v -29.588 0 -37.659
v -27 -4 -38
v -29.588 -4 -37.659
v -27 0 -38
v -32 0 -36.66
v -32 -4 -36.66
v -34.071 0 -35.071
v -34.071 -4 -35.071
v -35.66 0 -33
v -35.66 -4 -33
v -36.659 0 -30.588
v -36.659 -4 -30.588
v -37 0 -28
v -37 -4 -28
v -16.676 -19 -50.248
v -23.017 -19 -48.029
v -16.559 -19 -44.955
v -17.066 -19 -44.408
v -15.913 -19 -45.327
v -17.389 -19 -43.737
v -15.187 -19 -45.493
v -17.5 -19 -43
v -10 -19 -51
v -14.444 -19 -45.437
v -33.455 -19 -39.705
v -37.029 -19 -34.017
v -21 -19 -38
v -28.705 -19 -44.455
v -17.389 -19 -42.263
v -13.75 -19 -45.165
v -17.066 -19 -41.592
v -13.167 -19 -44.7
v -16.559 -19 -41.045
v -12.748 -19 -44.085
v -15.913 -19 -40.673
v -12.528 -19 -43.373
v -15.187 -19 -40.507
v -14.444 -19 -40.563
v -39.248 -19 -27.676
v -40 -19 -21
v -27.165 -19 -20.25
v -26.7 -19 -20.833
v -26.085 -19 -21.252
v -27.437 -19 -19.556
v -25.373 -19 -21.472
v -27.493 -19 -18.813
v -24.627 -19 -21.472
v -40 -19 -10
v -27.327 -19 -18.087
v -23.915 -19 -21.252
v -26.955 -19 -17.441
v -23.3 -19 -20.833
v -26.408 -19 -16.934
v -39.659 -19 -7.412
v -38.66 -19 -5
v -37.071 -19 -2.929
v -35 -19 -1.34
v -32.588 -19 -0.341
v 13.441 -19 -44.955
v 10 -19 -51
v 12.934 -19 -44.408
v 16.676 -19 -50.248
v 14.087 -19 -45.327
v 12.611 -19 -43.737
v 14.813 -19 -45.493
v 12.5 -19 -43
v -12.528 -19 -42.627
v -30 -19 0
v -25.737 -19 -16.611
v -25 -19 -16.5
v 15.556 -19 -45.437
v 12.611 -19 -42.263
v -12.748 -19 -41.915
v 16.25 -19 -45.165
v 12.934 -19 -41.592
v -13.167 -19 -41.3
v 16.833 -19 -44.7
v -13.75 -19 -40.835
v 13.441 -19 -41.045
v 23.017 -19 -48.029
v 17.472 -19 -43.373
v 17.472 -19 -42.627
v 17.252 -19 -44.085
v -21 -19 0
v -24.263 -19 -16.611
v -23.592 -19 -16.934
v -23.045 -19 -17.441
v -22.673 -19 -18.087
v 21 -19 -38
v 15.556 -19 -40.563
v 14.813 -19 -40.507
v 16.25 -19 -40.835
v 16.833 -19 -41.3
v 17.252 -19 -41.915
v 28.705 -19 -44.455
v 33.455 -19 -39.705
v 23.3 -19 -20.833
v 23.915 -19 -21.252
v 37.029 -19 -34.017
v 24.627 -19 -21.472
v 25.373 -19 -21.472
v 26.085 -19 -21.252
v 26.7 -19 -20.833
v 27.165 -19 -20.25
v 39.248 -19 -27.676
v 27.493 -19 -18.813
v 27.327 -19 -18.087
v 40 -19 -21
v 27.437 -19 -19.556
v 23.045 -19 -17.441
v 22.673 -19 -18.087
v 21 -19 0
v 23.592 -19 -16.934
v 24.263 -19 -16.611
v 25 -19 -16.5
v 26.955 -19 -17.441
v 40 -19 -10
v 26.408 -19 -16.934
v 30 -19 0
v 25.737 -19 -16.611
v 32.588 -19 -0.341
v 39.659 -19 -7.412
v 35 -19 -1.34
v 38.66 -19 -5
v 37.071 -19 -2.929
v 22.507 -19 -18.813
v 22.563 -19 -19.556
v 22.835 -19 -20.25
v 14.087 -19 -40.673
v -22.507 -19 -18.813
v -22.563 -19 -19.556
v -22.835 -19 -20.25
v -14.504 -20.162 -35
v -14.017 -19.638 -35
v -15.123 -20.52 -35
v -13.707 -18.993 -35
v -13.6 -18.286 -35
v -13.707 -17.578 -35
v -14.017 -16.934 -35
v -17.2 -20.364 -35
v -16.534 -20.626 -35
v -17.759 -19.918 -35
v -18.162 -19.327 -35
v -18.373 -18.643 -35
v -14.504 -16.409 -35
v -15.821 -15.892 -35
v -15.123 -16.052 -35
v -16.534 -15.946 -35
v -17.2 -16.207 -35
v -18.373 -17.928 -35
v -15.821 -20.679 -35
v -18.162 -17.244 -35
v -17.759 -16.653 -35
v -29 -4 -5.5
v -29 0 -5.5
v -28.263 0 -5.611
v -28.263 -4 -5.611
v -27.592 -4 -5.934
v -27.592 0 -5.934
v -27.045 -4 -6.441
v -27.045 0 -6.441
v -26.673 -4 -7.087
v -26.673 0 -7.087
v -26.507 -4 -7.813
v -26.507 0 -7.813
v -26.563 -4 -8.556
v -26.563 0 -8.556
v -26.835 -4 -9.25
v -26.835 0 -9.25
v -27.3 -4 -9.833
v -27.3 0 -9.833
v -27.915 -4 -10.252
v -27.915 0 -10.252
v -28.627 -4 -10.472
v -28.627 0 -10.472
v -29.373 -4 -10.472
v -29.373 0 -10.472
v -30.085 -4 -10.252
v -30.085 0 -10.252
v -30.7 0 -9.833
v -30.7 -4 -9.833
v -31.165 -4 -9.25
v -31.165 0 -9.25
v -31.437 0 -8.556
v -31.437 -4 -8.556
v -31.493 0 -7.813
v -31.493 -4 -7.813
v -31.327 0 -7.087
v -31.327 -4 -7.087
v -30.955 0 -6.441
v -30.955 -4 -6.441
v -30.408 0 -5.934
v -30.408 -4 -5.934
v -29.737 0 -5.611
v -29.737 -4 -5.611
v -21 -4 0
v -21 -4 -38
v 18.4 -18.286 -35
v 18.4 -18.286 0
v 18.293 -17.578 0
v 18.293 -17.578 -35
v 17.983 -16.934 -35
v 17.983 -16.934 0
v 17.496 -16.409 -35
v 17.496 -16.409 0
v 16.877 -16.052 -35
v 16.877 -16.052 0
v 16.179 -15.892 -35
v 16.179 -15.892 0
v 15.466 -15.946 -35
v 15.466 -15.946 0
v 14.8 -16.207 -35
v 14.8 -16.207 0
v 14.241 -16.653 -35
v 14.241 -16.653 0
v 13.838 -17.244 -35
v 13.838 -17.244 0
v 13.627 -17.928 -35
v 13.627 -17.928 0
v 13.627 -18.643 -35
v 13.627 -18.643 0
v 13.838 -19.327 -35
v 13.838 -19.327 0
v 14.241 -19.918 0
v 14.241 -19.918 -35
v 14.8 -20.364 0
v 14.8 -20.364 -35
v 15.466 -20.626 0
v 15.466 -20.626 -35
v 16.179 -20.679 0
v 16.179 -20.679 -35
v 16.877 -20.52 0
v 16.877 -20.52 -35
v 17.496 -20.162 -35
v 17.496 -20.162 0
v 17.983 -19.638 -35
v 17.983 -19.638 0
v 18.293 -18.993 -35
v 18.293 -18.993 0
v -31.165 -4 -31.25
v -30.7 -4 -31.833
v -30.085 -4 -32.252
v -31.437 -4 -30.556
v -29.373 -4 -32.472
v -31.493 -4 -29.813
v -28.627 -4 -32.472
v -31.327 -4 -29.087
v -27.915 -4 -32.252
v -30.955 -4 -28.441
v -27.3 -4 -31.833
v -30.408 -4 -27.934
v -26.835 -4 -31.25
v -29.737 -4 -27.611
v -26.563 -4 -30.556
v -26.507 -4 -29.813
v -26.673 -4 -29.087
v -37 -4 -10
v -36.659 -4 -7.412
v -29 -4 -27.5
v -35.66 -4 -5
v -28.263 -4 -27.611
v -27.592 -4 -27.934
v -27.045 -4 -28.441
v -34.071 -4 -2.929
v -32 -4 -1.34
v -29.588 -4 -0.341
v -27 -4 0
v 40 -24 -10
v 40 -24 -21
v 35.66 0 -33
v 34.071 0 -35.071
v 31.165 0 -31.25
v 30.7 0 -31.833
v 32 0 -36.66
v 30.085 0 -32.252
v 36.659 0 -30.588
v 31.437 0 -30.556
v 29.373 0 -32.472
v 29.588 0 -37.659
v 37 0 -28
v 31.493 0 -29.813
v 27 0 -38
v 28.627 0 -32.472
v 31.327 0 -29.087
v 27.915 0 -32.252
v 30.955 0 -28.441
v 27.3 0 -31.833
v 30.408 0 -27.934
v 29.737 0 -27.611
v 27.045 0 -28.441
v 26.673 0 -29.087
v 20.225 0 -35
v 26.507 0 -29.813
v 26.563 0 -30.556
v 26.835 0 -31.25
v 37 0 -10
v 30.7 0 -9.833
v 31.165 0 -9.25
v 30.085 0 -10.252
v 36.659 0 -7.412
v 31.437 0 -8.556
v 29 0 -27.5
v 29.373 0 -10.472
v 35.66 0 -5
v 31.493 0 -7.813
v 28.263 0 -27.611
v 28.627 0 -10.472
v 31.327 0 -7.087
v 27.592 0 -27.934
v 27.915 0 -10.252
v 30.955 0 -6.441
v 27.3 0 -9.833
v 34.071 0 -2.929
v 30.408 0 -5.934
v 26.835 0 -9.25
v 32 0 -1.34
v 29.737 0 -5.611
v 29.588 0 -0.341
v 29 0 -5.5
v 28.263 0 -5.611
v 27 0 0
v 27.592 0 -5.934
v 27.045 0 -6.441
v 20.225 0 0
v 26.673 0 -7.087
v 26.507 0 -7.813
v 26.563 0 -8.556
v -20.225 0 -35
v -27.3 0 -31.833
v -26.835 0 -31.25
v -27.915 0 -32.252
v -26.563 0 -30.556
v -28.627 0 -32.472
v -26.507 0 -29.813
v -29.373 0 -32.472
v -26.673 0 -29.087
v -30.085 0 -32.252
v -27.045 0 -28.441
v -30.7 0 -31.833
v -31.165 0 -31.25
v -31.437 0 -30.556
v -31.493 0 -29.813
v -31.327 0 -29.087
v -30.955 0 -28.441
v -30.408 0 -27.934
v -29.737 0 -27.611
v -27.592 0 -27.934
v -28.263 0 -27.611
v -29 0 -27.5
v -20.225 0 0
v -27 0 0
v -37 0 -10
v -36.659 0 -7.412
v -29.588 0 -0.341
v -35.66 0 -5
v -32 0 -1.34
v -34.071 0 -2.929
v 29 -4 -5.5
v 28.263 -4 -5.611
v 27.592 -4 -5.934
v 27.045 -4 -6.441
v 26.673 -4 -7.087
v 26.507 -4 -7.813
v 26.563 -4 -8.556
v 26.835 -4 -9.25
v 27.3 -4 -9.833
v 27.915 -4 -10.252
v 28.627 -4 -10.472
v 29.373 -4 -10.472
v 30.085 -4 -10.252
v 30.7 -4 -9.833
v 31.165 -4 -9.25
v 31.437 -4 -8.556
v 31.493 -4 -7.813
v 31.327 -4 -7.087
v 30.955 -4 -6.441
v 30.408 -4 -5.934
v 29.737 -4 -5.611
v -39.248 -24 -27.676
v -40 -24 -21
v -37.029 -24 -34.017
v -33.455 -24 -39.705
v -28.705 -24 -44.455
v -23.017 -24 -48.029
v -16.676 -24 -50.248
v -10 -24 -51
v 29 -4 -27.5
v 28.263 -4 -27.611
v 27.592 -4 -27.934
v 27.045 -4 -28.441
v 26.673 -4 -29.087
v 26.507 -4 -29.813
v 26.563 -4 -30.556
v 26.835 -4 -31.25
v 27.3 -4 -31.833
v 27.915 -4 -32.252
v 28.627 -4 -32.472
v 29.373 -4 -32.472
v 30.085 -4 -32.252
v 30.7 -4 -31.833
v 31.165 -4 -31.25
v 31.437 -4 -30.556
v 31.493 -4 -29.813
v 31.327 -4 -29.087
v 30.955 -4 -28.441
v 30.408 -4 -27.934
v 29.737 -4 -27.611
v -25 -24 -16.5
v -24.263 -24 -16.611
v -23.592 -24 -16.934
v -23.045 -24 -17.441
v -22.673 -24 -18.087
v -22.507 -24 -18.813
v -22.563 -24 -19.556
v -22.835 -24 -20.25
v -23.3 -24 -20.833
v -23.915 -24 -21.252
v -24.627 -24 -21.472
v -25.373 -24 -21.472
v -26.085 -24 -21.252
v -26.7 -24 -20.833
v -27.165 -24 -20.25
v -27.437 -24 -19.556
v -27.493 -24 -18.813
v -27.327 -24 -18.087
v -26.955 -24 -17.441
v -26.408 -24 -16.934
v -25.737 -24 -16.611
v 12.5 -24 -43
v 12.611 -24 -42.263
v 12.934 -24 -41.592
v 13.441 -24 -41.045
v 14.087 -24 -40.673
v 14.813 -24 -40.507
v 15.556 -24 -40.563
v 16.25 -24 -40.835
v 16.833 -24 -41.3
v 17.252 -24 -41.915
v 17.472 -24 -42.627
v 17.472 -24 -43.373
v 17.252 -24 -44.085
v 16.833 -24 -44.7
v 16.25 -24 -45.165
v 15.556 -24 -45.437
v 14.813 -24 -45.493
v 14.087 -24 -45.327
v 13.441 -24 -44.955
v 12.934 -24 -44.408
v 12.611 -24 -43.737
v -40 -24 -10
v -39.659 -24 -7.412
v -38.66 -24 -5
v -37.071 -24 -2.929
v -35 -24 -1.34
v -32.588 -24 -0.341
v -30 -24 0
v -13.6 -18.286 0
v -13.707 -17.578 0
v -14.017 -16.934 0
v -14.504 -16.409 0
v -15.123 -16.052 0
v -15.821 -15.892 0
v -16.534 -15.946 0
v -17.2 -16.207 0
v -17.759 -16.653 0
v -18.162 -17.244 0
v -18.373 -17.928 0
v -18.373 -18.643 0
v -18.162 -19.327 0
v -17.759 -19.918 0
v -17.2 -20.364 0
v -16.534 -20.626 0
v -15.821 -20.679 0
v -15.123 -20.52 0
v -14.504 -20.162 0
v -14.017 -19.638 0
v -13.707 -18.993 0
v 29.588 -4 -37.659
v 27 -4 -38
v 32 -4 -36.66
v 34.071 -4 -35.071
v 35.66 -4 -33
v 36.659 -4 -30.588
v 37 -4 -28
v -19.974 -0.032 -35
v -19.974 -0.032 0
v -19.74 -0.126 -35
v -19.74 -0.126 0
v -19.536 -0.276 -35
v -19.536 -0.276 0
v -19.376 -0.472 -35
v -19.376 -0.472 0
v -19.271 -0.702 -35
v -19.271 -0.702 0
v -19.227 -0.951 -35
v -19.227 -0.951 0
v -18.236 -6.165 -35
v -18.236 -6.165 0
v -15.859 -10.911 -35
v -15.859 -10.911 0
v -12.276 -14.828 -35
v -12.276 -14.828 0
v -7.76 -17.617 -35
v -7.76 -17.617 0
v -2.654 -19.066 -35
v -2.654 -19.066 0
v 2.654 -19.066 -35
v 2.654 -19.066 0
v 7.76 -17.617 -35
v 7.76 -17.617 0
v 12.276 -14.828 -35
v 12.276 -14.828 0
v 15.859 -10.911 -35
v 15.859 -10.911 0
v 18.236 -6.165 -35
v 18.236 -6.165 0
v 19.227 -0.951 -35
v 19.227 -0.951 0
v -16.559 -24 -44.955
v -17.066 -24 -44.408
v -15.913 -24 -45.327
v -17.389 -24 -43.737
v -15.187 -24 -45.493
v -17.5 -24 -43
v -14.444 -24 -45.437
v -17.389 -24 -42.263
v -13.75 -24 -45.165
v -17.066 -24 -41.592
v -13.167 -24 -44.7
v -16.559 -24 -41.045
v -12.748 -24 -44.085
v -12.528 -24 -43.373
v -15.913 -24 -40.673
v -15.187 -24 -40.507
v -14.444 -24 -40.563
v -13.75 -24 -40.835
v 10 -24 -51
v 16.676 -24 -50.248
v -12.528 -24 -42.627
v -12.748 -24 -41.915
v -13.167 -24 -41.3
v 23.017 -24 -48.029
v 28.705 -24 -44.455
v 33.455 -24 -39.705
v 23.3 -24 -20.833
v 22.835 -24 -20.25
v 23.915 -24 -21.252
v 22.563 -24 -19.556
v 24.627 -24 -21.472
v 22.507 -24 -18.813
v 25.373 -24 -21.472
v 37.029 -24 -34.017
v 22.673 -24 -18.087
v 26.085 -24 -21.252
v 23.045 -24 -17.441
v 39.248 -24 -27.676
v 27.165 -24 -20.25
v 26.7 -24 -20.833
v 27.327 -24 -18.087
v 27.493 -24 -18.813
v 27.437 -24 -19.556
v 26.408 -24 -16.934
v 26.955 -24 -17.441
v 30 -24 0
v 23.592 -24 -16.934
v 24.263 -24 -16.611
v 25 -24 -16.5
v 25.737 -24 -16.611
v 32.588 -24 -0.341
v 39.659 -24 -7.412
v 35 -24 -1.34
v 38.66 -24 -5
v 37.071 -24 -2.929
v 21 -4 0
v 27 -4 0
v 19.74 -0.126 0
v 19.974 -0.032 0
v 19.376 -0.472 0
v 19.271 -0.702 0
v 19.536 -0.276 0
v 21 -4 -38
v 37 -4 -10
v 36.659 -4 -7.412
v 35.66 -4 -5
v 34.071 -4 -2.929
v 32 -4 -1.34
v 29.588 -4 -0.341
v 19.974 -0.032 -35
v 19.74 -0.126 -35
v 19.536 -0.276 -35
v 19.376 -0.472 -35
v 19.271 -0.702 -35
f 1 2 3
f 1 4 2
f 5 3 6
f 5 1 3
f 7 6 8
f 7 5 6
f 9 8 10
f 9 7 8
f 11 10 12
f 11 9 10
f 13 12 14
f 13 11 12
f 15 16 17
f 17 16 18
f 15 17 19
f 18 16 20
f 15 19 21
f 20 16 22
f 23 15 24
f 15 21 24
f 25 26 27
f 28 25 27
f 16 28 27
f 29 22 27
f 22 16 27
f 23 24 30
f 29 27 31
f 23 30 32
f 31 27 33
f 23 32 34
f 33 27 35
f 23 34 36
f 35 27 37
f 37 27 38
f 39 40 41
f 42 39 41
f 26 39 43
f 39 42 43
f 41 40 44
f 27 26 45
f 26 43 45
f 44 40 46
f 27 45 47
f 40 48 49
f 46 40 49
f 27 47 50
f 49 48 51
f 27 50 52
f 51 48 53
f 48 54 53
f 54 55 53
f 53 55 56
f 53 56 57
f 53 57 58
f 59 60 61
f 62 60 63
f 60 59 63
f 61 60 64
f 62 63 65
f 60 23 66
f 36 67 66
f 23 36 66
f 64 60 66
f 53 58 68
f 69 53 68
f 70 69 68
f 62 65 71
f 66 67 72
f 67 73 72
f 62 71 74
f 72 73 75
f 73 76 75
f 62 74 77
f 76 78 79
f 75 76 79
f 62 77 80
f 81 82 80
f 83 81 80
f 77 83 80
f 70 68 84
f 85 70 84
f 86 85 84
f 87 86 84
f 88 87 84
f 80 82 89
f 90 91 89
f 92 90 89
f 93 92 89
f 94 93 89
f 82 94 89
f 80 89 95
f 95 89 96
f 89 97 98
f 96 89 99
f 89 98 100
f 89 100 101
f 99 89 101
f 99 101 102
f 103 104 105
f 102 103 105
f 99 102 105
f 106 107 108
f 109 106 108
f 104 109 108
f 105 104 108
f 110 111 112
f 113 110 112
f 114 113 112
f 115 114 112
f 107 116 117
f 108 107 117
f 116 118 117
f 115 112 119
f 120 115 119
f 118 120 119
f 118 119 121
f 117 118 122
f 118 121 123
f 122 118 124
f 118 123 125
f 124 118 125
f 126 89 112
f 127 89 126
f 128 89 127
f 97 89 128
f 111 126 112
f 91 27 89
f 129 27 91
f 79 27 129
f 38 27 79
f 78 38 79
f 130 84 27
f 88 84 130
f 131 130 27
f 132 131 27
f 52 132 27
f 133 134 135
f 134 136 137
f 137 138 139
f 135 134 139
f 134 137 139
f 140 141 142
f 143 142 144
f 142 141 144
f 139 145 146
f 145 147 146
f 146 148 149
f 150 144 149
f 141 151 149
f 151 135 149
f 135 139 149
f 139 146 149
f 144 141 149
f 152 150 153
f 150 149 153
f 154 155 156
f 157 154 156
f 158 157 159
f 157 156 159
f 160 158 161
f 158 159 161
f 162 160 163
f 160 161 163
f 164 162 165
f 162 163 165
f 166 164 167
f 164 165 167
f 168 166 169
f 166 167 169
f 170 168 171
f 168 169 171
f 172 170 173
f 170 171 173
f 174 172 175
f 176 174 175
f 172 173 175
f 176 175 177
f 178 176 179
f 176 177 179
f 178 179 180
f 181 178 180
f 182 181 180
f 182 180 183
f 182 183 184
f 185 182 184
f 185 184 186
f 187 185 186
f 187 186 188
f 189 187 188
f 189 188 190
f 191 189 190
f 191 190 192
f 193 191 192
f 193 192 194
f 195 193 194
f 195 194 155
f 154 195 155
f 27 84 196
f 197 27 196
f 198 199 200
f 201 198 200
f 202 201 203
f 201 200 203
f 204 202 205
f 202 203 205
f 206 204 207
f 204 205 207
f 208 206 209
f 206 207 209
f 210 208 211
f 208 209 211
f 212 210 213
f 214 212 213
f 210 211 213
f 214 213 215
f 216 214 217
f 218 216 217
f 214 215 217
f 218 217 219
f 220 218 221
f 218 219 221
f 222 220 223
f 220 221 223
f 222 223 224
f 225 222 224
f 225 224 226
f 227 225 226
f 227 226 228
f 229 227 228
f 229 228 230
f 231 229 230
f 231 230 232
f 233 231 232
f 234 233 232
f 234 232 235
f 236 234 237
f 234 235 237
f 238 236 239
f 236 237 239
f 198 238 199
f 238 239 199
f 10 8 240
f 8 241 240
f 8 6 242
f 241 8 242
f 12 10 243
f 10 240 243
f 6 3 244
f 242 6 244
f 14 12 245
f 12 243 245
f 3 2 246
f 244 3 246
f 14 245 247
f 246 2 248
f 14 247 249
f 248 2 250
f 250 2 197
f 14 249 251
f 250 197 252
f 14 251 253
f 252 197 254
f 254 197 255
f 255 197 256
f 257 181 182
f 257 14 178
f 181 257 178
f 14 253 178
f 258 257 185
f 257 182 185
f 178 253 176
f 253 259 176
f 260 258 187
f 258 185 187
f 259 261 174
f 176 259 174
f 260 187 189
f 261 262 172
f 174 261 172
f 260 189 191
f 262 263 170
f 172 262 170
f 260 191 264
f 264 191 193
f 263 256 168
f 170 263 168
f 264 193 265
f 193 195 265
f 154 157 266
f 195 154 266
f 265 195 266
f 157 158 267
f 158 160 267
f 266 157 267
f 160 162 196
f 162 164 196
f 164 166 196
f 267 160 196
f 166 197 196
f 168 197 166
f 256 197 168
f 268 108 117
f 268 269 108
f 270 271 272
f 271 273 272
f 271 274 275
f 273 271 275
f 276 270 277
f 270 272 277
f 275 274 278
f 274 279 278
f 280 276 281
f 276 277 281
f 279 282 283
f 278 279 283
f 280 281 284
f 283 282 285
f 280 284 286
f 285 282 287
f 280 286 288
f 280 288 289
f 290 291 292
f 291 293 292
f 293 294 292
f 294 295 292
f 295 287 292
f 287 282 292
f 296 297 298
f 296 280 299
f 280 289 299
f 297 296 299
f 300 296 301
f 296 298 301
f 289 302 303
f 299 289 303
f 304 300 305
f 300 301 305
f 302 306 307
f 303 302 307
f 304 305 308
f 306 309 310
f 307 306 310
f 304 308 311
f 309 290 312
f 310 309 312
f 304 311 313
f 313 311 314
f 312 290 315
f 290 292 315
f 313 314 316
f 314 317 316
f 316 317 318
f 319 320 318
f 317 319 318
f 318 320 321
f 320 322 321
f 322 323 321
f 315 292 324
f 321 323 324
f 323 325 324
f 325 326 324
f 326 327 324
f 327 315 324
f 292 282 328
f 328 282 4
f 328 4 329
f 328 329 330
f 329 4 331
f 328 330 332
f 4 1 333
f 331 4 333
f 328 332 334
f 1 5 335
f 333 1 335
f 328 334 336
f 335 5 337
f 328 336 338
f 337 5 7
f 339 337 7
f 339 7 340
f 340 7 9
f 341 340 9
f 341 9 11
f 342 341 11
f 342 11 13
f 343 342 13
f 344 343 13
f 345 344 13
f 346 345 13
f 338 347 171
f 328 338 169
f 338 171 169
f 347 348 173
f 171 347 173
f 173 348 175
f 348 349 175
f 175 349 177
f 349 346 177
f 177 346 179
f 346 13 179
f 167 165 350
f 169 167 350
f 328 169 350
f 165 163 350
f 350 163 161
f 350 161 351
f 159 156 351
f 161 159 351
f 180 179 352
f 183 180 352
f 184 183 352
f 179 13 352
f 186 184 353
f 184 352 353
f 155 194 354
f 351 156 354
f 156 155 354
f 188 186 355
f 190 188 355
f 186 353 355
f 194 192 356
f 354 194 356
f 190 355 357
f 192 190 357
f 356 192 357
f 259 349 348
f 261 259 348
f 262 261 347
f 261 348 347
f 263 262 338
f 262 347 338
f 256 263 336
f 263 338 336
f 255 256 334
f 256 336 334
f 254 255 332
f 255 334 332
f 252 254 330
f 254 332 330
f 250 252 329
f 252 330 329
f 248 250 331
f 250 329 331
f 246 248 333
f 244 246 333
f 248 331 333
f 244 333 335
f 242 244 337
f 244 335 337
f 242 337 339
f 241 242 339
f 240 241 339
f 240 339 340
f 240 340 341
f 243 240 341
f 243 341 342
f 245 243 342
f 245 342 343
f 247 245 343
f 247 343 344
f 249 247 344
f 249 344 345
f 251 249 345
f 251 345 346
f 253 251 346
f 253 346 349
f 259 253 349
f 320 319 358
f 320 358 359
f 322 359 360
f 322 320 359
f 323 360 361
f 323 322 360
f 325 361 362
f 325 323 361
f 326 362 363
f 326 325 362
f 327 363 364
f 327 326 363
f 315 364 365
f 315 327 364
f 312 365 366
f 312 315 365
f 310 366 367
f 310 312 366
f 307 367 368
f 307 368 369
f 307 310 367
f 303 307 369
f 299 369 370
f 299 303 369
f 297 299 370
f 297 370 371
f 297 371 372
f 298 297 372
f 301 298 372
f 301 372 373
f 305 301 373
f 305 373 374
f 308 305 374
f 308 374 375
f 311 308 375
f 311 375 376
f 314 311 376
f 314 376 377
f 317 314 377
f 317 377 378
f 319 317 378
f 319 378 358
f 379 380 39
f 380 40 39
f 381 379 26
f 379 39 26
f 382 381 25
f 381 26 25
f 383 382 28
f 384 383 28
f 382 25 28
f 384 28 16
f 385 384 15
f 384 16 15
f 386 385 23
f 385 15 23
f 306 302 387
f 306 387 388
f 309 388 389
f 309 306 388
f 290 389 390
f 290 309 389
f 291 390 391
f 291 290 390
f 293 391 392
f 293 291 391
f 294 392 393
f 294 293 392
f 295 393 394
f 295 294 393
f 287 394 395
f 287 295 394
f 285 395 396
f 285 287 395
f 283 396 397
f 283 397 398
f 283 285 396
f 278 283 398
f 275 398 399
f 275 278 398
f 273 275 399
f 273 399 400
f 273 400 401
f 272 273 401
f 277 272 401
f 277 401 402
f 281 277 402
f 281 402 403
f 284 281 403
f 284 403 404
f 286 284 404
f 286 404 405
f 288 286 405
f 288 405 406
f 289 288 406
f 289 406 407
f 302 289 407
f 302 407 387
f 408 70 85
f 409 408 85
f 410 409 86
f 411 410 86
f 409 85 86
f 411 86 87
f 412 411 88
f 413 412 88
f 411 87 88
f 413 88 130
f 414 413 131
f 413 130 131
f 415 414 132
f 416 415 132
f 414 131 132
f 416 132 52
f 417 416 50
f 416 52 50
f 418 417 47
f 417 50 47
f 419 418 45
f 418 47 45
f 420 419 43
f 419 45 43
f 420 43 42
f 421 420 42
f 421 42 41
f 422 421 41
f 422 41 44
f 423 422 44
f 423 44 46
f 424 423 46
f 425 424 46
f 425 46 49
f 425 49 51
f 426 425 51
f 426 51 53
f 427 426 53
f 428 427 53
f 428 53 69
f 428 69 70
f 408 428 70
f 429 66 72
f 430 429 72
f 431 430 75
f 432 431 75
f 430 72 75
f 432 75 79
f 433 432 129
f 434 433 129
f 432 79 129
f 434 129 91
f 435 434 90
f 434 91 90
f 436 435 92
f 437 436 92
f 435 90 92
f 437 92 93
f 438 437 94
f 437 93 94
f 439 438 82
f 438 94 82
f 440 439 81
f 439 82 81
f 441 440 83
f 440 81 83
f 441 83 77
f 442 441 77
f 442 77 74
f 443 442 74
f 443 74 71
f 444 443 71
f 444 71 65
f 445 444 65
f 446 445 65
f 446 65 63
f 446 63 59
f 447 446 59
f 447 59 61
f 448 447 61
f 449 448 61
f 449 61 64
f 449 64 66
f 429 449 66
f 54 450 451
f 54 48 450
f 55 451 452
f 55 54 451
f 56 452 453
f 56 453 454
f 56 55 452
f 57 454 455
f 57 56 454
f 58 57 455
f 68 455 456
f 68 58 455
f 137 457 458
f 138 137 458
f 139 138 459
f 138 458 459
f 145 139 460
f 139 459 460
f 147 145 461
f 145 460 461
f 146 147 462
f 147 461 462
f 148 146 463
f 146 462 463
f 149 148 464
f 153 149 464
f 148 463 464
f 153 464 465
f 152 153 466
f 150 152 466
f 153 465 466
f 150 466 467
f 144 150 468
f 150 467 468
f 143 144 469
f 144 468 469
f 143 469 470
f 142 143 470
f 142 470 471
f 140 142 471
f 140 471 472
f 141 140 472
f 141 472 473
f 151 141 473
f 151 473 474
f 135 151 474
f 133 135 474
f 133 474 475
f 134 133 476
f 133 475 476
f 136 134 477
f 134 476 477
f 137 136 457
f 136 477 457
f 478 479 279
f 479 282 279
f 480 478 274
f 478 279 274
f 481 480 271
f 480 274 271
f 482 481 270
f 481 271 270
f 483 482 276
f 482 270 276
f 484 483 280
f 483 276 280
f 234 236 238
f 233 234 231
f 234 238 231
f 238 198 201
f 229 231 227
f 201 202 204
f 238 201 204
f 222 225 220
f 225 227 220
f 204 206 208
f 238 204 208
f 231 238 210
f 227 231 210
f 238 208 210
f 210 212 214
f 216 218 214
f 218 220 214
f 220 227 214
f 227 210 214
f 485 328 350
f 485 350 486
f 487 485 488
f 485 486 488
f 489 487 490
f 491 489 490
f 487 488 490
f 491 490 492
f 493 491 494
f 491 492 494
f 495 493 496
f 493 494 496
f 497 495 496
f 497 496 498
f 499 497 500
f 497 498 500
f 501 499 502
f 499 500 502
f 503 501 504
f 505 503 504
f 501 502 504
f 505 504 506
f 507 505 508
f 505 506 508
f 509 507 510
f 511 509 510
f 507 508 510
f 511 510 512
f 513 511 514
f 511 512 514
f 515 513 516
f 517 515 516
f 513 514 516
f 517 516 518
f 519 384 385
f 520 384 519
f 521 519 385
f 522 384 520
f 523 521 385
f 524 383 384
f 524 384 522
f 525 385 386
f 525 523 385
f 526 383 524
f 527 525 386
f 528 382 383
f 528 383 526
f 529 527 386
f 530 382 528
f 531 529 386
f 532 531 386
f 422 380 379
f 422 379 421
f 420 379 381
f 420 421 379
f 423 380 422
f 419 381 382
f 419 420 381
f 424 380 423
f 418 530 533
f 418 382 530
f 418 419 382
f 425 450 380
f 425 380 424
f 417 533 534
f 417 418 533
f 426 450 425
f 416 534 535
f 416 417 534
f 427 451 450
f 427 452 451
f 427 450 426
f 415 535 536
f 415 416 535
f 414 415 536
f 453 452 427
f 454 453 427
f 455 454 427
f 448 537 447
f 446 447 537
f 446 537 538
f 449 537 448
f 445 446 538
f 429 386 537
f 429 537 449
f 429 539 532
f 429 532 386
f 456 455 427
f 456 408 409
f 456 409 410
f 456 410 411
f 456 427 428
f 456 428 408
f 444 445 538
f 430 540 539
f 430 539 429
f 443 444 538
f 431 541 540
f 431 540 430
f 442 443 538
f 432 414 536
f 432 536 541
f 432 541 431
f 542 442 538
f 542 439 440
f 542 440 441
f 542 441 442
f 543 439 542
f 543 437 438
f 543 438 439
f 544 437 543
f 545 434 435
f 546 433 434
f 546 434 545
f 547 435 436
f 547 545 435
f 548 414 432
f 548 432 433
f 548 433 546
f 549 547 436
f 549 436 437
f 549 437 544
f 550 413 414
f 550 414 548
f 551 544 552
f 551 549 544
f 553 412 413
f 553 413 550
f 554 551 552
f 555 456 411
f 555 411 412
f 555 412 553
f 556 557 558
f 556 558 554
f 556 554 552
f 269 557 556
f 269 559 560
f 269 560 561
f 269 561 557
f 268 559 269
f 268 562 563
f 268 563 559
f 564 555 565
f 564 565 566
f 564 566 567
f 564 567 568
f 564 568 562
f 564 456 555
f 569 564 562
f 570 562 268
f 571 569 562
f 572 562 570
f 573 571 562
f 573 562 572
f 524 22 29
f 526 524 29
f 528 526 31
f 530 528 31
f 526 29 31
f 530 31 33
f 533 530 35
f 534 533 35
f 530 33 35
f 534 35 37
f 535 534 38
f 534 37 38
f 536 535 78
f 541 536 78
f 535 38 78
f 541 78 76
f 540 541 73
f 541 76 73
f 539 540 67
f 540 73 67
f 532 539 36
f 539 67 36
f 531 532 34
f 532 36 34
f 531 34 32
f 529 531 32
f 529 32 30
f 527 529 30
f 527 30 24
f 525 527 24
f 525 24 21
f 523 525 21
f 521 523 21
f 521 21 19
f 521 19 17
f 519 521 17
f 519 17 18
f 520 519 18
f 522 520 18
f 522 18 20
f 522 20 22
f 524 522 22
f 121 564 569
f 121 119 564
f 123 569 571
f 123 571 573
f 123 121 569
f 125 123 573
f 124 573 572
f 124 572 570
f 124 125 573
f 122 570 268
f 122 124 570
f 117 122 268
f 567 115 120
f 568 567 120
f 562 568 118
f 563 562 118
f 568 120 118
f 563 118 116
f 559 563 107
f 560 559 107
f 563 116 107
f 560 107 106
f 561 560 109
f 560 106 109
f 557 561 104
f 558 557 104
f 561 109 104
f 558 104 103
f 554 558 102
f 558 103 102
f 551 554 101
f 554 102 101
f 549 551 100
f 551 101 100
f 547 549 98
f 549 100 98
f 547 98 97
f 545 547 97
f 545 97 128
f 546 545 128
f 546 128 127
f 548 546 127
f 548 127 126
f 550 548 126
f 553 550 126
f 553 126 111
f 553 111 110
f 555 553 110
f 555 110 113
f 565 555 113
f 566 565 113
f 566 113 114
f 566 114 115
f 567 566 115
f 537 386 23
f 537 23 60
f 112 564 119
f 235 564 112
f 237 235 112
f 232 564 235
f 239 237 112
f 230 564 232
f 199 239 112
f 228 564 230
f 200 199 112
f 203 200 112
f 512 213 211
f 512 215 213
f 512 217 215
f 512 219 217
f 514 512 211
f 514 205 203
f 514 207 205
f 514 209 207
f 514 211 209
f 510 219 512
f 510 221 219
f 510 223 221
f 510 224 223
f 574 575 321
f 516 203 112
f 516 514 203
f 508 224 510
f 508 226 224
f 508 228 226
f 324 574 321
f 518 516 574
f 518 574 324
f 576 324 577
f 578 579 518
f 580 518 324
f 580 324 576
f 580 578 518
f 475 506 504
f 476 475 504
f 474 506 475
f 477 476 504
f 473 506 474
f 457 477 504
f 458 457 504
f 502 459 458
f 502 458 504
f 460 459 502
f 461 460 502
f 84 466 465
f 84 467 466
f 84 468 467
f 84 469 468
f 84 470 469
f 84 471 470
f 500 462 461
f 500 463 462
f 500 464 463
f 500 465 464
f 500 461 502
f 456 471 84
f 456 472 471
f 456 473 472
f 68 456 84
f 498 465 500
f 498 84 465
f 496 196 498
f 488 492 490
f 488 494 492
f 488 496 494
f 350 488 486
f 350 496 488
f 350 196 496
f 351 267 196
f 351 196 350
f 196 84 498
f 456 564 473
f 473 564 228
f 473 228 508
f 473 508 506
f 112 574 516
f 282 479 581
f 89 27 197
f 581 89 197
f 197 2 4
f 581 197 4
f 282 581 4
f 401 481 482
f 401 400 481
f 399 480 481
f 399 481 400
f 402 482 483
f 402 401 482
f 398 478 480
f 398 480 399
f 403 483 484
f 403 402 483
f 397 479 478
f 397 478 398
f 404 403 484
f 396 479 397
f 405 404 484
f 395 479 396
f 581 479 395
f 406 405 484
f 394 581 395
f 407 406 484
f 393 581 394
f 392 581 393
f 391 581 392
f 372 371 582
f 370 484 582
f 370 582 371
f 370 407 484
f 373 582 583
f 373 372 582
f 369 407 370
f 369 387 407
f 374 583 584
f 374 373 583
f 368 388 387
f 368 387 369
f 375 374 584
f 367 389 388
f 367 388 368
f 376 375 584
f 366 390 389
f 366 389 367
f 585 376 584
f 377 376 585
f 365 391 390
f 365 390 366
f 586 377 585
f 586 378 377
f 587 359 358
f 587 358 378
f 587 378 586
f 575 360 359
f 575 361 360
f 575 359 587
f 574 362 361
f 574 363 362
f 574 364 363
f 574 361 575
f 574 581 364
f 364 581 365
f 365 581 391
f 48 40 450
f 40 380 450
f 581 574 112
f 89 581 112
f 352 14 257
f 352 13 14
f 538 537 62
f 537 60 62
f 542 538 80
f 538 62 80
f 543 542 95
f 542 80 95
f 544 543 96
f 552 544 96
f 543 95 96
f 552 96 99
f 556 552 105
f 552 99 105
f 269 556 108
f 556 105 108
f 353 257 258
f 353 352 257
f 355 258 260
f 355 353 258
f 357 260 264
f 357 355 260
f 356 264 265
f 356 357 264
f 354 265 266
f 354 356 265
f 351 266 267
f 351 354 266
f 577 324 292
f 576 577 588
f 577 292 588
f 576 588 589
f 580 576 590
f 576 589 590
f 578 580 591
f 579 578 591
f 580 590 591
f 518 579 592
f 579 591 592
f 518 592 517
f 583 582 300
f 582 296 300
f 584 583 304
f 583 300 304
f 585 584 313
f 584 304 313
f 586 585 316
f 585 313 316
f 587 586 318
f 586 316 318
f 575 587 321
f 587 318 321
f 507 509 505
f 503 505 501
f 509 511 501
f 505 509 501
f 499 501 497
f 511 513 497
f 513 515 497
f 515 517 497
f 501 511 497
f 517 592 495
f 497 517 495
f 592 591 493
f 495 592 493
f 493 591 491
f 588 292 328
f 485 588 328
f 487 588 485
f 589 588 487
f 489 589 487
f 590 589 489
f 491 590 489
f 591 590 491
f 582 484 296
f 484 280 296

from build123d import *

# Parameters (mm, degrees)
SKETCH1_W            = 42
SKETCH1_H            = 48
SKETCH1_R            = 19.25
SKETCH1_R_2          = 2.4
BOSS_EXTRUDE1_DEPTH  = 35
SKETCH4_W            = 19
SKETCH4_H            = 5
BOSS_EXTRUDE3_DEPTH  = 35
CUT_EXTRUDE1_REACH   = 70.367
SKETCH5_R            = 2.5
BOSS_EXTRUDE4_DEPTH  = 3
CUT_EXTRUDE2_REACH   = 62.166
SKETCH7_W            = 42
SKETCH7_H            = 24
FILLET1_R            = 1
SKETCH8_W            = 80
SKETCH8_H            = 13
BOSS_EXTRUDE5_DEPTH  = 5
CUT_EXTRUDE4_REACH   = 69.543
SKETCH10_R           = 2.5
FILLET5_R            = 30
FILLET6_R            = 10
SKETCH12_W           = 38
SKETCH12_H           = 4
BOSS_EXTRUDE6_DEPTH  = 16
CUT_EXTRUDE5_REACH   = 71.116
SKETCH13_R           = 2.5
FILLET7_R            = 10
FILLET7_OF_MIRROR1_R = 10


with BuildPart() as part:
    # Sketch1 → Boss-Extrude1 (new body)
    with BuildSketch(Plane.XY):
        Rectangle(SKETCH1_W, SKETCH1_H)
        Circle(SKETCH1_R, mode=Mode.SUBTRACT)
        with Locations((-16, 18.285714286)):
            Circle(SKETCH1_R_2, mode=Mode.SUBTRACT)
        with Locations((16, 18.285714286)):
            Circle(SKETCH1_R_2, mode=Mode.SUBTRACT)
        with Locations((16, -18.285714286)):
            Circle(SKETCH1_R_2, mode=Mode.SUBTRACT)
        with Locations((-16, -18.285714286)):
            Circle(SKETCH1_R_2, mode=Mode.SUBTRACT)
    extrude(amount=-BOSS_EXTRUDE1_DEPTH)

    # Sketch4 → Boss-Extrude3 (add)
    with BuildSketch(Plane.XY):
        with Locations((-30.5, -21.5)):
            Rectangle(SKETCH4_W, SKETCH4_H)
        with Locations((30.5, -21.5)):
            Rectangle(SKETCH4_W, SKETCH4_H)
    extrude(amount=-BOSS_EXTRUDE3_DEPTH)

    # Sketch5 → Cut-Extrude1 (cut, up to next)
    with BuildSketch(Plane(origin=(0, -19, 0), x_dir=(1, 0, 0), z_dir=(0, 1, 0)), mode=Mode.PRIVATE) as cut_extrude1_sk1:
        with Locations(Location((-25, 19, 0), (0, 0, 270))):
            Circle(SKETCH5_R)
    cut_extrude1_tool1 = extrude(cut_extrude1_sk1.sketch, amount=-CUT_EXTRUDE1_REACH, mode=Mode.PRIVATE) & part.part
    # Sketch5 → Cut-Extrude1 (cut, up to next)
    with BuildSketch(Plane(origin=(0, -19, 0), x_dir=(1, 0, 0), z_dir=(0, 1, 0)), mode=Mode.PRIVATE) as cut_extrude1_sk2:
        with Locations(Location((25, 19, 0), (0, 0, 270))):
            Circle(SKETCH5_R)
    cut_extrude1_tool2 = extrude(cut_extrude1_sk2.sketch, amount=-CUT_EXTRUDE1_REACH, mode=Mode.PRIVATE) & part.part
    add(cut_extrude1_tool1.solids().sort_by_distance((-25, -19, -19))[0], mode=Mode.SUBTRACT)
    add(cut_extrude1_tool2.solids().sort_by_distance((25, -19, -19))[0], mode=Mode.SUBTRACT)

    # Sketch6 → Boss-Extrude4 (add)
    with BuildSketch(Plane(origin=(0, 0, -35), x_dir=(-1, 0, 0), z_dir=(0, 0, -1))):
        Polygon((-21, 24), (-21, -19), (-40, -19), (-40, -24), (40, -24), (40, -19), (21, -19), (21, 24), align=None)
    extrude(amount=BOSS_EXTRUDE4_DEPTH)

    # Sketch7 → Cut-Extrude2 (cut, up to next)
    with BuildSketch(Plane.XY, mode=Mode.PRIVATE) as cut_extrude2_sk1:
        with Locations((0, 12)):
            Rectangle(SKETCH7_W, SKETCH7_H)
    cut_extrude2_tool1 = extrude(cut_extrude2_sk1.sketch, amount=-CUT_EXTRUDE2_REACH, mode=Mode.PRIVATE) & part.part
    add(cut_extrude2_tool1.solids().sort_by_distance((0, 12, 0))[0], mode=Mode.SUBTRACT)

    # Fillet1
    fillet1_edges = [part.edges().sort_by_distance(p)[0] for p in [
        (19.25, 0, -17.5),
        (-19.25, 0, -17.5),
    ]]
    fillet(fillet1_edges, radius=FILLET1_R)

    # Sketch8 → Boss-Extrude5 (add)
    with BuildSketch(Plane.XZ.offset(24)):
        with Locations((0, -44.5)):
            Rectangle(SKETCH8_W, SKETCH8_H)
    extrude(amount=-BOSS_EXTRUDE5_DEPTH)

    # Sketch10 → Cut-Extrude4 (cut, up to next)
    with BuildSketch(Plane(origin=(0, -19, 0), x_dir=(1, 0, 0), z_dir=(0, 1, 0)), mode=Mode.PRIVATE) as cut_extrude4_sk1:
        with Locations(Location((-15, 43, 0), (0, 0, 180))):
            Circle(SKETCH10_R)
    cut_extrude4_tool1 = extrude(cut_extrude4_sk1.sketch, amount=-CUT_EXTRUDE4_REACH, mode=Mode.PRIVATE) & part.part
    # Sketch10 → Cut-Extrude4 (cut, up to next)
    with BuildSketch(Plane(origin=(0, -19, 0), x_dir=(1, 0, 0), z_dir=(0, 1, 0)), mode=Mode.PRIVATE) as cut_extrude4_sk2:
        with Locations(Location((15, 43, 0), (0, 0, 180))):
            Circle(SKETCH10_R)
    cut_extrude4_tool2 = extrude(cut_extrude4_sk2.sketch, amount=-CUT_EXTRUDE4_REACH, mode=Mode.PRIVATE) & part.part
    add(cut_extrude4_tool1.solids().sort_by_distance((-15, -19, -43))[0], mode=Mode.SUBTRACT)
    add(cut_extrude4_tool2.solids().sort_by_distance((15, -19, -43))[0], mode=Mode.SUBTRACT)

    # Fillet5
    fillet5_edges = [part.edges().sort_by_distance(p)[0] for p in [
        (-40, -21.5, -51),
        (40, -21.5, -51),
    ]]
    fillet(fillet5_edges, radius=FILLET5_R)

    # Fillet6
    fillet6_edges = [part.edges().sort_by_distance(p)[0] for p in [
        (-40, -21.5, 0),
        (40, -21.5, 0),
    ]]
    fillet(fillet6_edges, radius=FILLET6_R)

    # Sketch12 → Boss-Extrude6 (add)
    with BuildSketch(Plane.ZY.offset(21)):
        with Locations((-19, -2)):
            Rectangle(SKETCH12_W, SKETCH12_H)
    boss_extrude6 = extrude(amount=BOSS_EXTRUDE6_DEPTH)

    # Sketch13 → Cut-Extrude5 (cut, up to next)
    with BuildSketch(Plane(origin=(0, 0, 0), x_dir=(1, 0, 0), z_dir=(0, 1, 0)), mode=Mode.PRIVATE) as cut_extrude5_sk1:
        with Locations(Location((-29, 8, 0), (0, 0, 270))):
            Circle(SKETCH13_R)
    cut_extrude5_tool1 = extrude(cut_extrude5_sk1.sketch, amount=-CUT_EXTRUDE5_REACH, mode=Mode.PRIVATE) & part.part
    # Sketch13 → Cut-Extrude5 (cut, up to next)
    with BuildSketch(Plane(origin=(0, 0, 0), x_dir=(1, 0, 0), z_dir=(0, 1, 0)), mode=Mode.PRIVATE) as cut_extrude5_sk2:
        with Locations(Location((-29, 30, 0), (0, 0, 270))):
            Circle(SKETCH13_R)
    cut_extrude5_tool2 = extrude(cut_extrude5_sk2.sketch, amount=-CUT_EXTRUDE5_REACH, mode=Mode.PRIVATE) & part.part
    cut_extrude5_1 = cut_extrude5_tool1.solids().sort_by_distance((-29, 0, -8))[0]
    add(cut_extrude5_1, mode=Mode.SUBTRACT)
    cut_extrude5_2 = cut_extrude5_tool2.solids().sort_by_distance((-29, 0, -30))[0]
    add(cut_extrude5_2, mode=Mode.SUBTRACT)
    cut_extrude5 = cut_extrude5_1 + cut_extrude5_2  # Cut-Extrude5 as one shape, for the pattern or mirror that repeats it

    # Fillet7
    fillet7_edges = [part.edges().sort_by_distance(p)[0] for p in [
        (-37, -2, 0),
        (-37, -2, -38),
    ]]
    fillet(fillet7_edges, radius=FILLET7_R)

    # Mirror1: Boss-Extrude6, Cut-Extrude5 across plane
    add(boss_extrude6.mirror(Plane(origin=(0, 0, 0), x_dir=(0, 0, 1), z_dir=(1, 0, 0))))
    add(cut_extrude5.mirror(Plane(origin=(0, 0, 0), x_dir=(0, 0, 1), z_dir=(1, 0, 0))), mode=Mode.SUBTRACT)

    # Fillet7 of Mirror1
    fillet7_of_mirror1_edges = [part.edges().sort_by_distance(p)[0] for p in [
        (37, -2, 0),
        (37, -2, -38),
    ]]
    fillet(fillet7_of_mirror1_edges, radius=FILLET7_OF_MIRROR1_R)


solid = part.part
